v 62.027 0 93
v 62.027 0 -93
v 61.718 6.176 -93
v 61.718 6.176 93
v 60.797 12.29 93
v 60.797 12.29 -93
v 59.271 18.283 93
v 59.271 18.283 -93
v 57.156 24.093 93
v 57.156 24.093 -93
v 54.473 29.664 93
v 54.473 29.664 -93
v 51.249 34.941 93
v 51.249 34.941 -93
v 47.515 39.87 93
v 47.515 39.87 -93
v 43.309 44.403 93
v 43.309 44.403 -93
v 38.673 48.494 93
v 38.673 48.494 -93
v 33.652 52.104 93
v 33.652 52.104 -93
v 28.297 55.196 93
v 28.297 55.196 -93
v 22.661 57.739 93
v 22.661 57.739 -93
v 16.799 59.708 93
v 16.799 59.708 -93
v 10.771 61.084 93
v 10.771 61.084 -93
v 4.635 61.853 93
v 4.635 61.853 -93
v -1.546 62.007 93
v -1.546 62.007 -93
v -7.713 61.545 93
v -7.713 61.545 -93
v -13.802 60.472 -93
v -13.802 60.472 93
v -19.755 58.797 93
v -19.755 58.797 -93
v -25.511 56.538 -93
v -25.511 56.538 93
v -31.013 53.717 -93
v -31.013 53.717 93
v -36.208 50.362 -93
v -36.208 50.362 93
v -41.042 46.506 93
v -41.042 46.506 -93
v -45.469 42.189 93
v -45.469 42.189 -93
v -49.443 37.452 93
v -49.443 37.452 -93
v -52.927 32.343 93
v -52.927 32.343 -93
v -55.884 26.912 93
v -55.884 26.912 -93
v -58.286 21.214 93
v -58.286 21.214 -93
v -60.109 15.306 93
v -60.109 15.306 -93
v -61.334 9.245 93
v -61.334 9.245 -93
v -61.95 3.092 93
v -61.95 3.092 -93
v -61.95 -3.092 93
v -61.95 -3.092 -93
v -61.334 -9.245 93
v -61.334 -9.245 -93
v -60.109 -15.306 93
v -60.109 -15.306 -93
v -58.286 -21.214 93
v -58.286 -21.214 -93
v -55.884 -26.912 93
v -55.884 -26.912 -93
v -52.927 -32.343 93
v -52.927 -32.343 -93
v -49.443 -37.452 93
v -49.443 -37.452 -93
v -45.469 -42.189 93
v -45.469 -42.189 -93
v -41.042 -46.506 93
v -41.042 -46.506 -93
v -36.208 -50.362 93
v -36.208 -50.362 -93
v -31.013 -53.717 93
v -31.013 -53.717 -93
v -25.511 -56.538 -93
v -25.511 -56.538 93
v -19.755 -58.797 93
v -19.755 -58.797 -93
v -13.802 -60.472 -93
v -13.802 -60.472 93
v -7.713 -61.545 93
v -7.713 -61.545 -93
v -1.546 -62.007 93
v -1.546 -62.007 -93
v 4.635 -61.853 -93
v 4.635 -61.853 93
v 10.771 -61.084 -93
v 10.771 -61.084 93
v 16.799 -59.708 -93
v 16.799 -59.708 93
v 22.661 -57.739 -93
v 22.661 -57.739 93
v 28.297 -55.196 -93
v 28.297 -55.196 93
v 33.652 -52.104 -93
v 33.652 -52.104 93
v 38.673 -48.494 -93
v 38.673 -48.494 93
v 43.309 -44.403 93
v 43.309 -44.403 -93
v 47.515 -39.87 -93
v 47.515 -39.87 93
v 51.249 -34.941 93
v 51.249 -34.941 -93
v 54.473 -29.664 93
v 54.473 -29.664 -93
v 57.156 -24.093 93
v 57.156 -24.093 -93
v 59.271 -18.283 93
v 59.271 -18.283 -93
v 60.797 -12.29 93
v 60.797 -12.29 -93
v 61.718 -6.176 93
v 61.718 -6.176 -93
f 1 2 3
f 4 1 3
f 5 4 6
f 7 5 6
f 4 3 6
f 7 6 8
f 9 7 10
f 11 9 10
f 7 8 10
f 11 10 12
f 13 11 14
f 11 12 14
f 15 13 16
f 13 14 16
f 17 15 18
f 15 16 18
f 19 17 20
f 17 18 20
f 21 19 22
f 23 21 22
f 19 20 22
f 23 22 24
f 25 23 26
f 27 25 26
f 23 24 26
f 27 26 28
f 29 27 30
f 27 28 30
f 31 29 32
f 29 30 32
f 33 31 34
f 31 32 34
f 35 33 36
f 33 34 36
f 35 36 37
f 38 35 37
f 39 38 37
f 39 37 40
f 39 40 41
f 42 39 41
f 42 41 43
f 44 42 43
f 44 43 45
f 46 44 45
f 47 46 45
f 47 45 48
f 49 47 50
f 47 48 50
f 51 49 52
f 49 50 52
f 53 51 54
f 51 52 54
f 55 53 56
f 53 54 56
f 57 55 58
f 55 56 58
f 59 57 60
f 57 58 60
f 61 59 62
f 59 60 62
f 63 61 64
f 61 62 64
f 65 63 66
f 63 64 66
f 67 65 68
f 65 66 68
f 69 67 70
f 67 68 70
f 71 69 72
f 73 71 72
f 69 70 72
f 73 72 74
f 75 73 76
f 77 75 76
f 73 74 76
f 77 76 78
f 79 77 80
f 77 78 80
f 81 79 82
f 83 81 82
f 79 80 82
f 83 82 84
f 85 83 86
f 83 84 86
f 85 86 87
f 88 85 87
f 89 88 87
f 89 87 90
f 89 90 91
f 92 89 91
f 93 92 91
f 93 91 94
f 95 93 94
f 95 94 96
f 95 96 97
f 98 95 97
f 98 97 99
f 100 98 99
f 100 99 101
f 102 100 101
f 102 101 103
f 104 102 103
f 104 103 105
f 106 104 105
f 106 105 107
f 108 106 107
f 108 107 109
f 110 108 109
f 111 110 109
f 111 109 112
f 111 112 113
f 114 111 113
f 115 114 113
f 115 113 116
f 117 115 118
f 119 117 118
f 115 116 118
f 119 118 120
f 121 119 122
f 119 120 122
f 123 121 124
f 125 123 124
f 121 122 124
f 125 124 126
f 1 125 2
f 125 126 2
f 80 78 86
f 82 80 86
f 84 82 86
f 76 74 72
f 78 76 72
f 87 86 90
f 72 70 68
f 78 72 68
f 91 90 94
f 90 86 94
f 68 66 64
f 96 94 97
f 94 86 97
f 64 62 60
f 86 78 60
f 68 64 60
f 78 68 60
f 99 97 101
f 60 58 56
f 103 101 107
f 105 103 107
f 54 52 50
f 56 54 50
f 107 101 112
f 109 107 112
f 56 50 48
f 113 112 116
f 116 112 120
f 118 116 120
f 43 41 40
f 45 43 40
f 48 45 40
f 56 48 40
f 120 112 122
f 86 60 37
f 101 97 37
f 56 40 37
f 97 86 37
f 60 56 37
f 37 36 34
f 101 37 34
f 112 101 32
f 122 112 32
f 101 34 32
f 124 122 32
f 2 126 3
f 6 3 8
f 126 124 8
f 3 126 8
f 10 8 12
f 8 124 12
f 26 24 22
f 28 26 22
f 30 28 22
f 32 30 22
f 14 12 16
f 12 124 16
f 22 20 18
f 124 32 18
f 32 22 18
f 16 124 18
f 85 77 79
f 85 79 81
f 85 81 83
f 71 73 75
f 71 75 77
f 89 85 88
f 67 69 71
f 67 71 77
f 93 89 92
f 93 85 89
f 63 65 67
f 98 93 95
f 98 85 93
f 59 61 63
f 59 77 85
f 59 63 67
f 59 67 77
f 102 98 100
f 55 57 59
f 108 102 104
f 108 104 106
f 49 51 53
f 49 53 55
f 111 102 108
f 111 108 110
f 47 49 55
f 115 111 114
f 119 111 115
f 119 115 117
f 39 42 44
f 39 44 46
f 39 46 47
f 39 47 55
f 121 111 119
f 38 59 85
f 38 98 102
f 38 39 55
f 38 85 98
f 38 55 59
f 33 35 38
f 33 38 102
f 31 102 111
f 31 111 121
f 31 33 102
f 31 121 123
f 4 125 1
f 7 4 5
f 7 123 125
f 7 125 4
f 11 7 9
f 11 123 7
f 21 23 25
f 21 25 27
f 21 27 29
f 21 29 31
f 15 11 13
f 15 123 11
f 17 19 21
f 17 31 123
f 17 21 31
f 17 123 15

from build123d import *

# Parameters (mm, degrees)
KNIT_START       = -93
KNIT_1_OUTLINE_R = 62.02666435
KNIT_1_DEPTH     = 186


# Read off the part's stored shape, not the designer's step: 曲面-缝合1
with BuildPart() as part:
    # Knit 1 outline → Knit 1 (new body)
    with BuildSketch(Plane.XY.offset(KNIT_START)):
        Circle(KNIT_1_OUTLINE_R)
    extrude(amount=KNIT_1_DEPTH)


solid = part.part
